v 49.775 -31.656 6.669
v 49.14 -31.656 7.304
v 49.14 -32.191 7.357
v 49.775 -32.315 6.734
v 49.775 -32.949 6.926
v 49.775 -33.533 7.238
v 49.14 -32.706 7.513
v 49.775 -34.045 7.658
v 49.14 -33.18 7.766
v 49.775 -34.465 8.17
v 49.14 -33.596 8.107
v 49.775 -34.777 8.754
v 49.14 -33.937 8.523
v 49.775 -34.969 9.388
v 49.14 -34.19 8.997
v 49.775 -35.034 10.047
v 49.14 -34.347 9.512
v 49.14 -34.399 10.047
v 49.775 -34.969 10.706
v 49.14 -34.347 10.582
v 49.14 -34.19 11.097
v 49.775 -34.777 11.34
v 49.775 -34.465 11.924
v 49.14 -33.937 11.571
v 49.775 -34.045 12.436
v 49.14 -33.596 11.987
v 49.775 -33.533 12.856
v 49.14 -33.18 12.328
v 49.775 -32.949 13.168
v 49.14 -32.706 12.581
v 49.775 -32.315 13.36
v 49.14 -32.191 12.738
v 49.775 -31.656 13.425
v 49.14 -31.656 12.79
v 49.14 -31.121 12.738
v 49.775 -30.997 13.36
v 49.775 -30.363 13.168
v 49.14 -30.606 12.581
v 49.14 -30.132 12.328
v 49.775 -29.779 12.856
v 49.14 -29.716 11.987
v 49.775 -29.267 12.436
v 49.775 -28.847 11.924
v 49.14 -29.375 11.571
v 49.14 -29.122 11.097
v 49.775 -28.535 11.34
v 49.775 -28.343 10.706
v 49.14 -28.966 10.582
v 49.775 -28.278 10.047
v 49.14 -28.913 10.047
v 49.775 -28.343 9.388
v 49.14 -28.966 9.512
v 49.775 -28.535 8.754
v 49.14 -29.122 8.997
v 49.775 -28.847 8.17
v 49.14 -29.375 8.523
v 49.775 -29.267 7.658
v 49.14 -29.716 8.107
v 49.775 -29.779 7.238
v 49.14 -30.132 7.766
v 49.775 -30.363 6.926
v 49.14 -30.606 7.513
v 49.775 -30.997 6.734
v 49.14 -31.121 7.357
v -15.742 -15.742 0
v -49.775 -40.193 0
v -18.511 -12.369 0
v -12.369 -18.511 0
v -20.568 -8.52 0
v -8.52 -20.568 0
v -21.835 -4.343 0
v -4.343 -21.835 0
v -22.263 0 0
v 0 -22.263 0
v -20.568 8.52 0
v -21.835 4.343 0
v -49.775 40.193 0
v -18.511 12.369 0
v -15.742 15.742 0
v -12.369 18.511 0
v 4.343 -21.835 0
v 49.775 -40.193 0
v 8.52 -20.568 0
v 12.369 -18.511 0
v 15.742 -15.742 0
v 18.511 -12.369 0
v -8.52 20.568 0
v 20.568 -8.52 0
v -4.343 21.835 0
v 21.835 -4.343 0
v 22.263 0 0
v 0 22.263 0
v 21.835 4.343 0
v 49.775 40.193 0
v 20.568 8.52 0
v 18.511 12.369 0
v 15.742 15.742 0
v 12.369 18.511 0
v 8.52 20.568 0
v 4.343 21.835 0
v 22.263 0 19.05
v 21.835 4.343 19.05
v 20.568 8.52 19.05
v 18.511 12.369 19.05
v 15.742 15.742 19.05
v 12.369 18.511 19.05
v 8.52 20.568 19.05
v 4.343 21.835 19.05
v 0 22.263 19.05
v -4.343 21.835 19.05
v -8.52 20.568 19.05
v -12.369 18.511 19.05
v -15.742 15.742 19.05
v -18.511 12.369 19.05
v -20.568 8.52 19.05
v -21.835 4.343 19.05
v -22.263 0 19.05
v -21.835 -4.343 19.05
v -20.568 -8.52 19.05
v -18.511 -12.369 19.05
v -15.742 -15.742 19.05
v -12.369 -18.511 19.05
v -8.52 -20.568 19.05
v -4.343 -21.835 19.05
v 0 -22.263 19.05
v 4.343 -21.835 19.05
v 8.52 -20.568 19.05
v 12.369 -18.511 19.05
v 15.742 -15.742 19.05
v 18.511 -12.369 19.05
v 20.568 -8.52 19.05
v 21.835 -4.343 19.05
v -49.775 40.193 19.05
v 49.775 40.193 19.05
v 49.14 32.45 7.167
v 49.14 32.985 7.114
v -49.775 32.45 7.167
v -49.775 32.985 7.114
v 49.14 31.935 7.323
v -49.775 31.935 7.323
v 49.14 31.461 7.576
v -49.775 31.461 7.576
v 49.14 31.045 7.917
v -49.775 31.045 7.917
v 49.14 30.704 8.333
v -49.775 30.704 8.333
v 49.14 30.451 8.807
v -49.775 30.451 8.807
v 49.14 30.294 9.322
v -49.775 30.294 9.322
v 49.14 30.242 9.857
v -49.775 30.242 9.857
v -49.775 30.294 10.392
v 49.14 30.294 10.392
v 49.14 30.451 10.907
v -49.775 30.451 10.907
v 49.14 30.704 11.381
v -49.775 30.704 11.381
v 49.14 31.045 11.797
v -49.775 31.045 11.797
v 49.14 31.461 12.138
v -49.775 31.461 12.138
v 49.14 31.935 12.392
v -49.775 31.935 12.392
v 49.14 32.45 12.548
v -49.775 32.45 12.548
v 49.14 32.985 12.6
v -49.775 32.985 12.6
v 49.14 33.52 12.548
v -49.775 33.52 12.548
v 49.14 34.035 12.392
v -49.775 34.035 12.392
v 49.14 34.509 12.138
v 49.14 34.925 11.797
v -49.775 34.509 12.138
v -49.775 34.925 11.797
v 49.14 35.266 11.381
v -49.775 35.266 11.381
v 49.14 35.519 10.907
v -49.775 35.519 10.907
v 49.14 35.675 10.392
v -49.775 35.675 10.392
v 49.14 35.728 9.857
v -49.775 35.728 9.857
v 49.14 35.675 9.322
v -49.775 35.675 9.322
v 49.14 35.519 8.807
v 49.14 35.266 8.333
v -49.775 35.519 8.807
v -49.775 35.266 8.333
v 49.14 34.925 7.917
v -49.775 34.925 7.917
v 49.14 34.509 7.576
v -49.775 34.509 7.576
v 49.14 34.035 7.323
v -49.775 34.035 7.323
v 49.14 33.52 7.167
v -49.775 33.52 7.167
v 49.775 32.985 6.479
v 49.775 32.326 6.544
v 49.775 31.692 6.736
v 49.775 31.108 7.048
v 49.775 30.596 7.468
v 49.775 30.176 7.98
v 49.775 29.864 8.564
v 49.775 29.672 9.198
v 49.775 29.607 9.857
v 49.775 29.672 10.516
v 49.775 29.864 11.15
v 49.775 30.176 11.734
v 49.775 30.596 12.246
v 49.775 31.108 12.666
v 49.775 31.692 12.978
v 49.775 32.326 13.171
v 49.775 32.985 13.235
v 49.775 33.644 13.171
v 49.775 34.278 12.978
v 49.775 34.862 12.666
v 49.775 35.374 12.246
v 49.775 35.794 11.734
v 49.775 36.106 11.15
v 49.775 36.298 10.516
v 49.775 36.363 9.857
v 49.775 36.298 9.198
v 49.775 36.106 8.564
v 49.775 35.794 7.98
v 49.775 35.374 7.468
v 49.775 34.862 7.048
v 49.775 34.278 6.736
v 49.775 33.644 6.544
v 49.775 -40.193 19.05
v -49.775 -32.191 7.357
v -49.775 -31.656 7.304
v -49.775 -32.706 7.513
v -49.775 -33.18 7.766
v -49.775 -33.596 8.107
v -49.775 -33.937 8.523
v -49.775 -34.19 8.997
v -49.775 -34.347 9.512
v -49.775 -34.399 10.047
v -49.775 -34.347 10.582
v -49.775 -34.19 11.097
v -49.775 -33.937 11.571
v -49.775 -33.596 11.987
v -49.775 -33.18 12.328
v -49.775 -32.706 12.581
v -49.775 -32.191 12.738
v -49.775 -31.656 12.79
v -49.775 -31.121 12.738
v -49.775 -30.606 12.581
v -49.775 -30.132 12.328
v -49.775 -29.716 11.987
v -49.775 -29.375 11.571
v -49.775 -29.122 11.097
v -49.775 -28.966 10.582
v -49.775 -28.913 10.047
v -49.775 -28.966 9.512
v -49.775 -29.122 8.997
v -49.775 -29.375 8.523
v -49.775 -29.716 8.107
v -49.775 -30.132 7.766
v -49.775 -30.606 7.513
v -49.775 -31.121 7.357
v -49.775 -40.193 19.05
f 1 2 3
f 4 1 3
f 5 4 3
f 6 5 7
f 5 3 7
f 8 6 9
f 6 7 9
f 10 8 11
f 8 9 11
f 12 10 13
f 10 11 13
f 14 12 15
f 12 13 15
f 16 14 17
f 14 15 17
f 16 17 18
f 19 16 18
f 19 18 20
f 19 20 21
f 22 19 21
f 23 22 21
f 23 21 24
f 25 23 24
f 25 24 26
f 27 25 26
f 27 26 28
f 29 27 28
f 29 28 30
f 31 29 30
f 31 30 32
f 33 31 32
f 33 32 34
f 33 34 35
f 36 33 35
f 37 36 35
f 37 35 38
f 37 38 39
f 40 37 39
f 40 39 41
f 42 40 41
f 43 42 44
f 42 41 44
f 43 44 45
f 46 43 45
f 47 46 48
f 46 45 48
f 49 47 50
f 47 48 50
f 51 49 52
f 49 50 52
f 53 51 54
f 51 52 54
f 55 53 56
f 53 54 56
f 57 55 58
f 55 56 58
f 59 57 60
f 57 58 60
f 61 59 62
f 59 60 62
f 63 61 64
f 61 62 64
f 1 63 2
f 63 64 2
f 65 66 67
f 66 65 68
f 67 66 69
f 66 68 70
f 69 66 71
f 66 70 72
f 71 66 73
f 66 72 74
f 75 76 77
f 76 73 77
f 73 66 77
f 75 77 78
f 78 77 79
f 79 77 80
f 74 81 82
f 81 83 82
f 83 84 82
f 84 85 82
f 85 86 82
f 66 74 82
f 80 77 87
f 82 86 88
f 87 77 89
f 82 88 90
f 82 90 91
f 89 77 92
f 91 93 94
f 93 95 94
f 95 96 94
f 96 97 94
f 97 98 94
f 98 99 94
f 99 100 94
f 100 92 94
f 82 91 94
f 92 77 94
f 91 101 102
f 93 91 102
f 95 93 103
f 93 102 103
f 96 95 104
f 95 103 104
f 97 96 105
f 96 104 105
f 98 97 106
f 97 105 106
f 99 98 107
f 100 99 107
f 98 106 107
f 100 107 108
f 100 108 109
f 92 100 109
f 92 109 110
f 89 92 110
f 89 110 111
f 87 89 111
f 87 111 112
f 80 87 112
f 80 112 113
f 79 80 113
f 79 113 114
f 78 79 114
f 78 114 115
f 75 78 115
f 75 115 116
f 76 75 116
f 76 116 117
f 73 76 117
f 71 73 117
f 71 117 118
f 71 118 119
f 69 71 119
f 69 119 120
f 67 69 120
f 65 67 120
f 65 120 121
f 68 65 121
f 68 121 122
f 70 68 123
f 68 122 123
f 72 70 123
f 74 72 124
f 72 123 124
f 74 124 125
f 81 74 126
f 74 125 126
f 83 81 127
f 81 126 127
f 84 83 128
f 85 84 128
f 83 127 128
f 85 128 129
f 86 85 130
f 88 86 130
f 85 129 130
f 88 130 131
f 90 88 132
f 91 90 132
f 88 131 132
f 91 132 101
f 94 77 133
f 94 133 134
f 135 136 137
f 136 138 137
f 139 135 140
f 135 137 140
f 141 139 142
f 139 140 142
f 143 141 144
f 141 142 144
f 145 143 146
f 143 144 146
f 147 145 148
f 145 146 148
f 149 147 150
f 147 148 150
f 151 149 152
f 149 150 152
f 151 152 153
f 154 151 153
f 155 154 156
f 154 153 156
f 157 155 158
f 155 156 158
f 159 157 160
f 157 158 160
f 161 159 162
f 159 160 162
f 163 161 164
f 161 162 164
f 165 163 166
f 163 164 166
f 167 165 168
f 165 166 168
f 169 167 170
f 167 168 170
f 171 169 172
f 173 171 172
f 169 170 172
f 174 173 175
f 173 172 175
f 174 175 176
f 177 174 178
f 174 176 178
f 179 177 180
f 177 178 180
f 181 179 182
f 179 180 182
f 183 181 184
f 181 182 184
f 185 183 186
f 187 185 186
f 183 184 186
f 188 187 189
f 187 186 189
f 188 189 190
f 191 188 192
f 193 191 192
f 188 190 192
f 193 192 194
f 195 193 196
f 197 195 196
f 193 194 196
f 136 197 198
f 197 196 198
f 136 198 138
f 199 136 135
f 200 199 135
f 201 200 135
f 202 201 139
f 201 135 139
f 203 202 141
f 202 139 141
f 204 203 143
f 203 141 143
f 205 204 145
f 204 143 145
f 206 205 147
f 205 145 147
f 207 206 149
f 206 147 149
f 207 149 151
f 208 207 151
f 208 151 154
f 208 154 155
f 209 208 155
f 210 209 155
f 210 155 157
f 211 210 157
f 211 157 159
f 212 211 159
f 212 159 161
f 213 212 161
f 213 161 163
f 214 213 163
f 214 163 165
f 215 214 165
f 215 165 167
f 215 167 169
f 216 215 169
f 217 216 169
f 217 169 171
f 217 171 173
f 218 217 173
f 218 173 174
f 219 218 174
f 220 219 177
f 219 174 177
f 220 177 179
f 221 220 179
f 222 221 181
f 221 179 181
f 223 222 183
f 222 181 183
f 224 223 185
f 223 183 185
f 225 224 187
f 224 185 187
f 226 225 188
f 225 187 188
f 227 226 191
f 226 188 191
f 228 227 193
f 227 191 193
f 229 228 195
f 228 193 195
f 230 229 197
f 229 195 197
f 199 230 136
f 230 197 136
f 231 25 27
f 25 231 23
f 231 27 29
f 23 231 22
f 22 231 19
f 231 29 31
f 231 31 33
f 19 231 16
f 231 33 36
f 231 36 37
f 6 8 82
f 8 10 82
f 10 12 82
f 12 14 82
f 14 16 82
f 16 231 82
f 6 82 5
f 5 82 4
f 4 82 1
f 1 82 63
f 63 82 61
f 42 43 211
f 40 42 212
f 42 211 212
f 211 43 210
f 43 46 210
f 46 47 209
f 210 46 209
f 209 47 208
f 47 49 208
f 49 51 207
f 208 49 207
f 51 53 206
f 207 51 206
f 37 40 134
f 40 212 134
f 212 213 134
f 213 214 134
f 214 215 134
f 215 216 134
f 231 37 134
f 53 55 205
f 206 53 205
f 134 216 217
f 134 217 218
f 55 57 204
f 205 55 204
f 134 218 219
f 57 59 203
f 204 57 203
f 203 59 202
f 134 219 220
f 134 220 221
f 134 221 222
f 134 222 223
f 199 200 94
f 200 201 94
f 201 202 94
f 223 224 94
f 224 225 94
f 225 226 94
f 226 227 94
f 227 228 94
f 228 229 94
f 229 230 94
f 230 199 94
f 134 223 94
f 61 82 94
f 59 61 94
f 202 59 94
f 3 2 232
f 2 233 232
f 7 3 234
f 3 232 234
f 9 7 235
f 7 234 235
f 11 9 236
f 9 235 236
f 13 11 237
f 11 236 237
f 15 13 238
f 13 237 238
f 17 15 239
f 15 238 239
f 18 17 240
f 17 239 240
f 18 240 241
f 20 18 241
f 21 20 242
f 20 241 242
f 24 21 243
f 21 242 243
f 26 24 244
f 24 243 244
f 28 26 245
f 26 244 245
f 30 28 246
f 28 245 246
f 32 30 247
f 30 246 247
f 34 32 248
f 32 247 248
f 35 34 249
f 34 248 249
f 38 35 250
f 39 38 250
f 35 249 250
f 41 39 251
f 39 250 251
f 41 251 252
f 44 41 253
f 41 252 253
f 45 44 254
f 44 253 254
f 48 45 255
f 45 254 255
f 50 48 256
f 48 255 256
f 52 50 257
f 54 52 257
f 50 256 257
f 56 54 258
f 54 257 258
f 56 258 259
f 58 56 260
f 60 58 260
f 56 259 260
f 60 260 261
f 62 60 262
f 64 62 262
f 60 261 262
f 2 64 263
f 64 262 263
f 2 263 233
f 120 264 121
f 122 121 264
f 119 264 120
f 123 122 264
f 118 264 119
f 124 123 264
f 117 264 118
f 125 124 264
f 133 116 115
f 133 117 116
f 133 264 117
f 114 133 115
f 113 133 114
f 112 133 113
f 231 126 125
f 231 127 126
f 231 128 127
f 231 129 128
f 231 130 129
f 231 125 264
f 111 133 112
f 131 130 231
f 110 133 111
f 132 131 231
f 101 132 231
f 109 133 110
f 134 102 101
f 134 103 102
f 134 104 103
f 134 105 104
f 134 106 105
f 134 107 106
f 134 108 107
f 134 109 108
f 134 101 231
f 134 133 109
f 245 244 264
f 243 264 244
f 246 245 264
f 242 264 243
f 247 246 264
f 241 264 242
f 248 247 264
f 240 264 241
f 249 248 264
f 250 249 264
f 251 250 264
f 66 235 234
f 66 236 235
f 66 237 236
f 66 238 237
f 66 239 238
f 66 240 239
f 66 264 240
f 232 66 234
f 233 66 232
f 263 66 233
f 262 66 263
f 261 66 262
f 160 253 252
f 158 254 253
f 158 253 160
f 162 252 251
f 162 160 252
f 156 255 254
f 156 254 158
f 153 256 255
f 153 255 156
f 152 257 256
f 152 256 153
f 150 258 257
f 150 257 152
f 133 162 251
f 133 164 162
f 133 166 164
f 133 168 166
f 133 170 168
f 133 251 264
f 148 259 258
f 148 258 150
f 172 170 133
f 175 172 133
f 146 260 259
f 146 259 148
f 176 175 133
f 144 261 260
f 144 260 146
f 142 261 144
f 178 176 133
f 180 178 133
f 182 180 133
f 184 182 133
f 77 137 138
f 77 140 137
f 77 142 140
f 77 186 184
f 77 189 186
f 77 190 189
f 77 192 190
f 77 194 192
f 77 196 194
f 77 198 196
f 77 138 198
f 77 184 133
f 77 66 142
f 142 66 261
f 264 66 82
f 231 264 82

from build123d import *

# Parameters (mm, degrees)
SKETCH1_W                        = 99.549072562
SKETCH1_H                        = 80.386282086
EXTRUDE2_DEPTH                   = 19.05
SKETCH2_R                        = 22.2631
EXTRUDE3_DEPTH                   = 20.05
F_12_24_TAPPED_HOLE1_D           = 5.4864
F_12_24_TAPPED_HOLE1_CSINK_D     = 6.7564
F_12_24_TAPPED_HOLE1_CSINK_ANGLE = 90


with BuildPart() as part:
    # Sketch1 → Extrude2 (new body)
    with BuildSketch(Plane.XY):
        Rectangle(SKETCH1_W, SKETCH1_H)
    extrude(amount=EXTRUDE2_DEPTH)

    # Sketch2 → Extrude3 (cut, through all)
    with BuildSketch(Plane.XY.offset(19.05)):
        Circle(SKETCH2_R)
    extrude(amount=-EXTRUDE3_DEPTH, mode=Mode.SUBTRACT)

    # #12-24 Tapped Hole1 (through all)
    with Locations(Plane(origin=(49.774536281, 32.984966891, 9.857222688), x_dir=(0, 0, 1), z_dir=(1, 0, 0))):
        with Locations((0, 0), (0.189841536, 64.64104303)):
            CounterSinkHole(F_12_24_TAPPED_HOLE1_D / 2, F_12_24_TAPPED_HOLE1_CSINK_D / 2, counter_sink_angle=F_12_24_TAPPED_HOLE1_CSINK_ANGLE)


solid = part.part
